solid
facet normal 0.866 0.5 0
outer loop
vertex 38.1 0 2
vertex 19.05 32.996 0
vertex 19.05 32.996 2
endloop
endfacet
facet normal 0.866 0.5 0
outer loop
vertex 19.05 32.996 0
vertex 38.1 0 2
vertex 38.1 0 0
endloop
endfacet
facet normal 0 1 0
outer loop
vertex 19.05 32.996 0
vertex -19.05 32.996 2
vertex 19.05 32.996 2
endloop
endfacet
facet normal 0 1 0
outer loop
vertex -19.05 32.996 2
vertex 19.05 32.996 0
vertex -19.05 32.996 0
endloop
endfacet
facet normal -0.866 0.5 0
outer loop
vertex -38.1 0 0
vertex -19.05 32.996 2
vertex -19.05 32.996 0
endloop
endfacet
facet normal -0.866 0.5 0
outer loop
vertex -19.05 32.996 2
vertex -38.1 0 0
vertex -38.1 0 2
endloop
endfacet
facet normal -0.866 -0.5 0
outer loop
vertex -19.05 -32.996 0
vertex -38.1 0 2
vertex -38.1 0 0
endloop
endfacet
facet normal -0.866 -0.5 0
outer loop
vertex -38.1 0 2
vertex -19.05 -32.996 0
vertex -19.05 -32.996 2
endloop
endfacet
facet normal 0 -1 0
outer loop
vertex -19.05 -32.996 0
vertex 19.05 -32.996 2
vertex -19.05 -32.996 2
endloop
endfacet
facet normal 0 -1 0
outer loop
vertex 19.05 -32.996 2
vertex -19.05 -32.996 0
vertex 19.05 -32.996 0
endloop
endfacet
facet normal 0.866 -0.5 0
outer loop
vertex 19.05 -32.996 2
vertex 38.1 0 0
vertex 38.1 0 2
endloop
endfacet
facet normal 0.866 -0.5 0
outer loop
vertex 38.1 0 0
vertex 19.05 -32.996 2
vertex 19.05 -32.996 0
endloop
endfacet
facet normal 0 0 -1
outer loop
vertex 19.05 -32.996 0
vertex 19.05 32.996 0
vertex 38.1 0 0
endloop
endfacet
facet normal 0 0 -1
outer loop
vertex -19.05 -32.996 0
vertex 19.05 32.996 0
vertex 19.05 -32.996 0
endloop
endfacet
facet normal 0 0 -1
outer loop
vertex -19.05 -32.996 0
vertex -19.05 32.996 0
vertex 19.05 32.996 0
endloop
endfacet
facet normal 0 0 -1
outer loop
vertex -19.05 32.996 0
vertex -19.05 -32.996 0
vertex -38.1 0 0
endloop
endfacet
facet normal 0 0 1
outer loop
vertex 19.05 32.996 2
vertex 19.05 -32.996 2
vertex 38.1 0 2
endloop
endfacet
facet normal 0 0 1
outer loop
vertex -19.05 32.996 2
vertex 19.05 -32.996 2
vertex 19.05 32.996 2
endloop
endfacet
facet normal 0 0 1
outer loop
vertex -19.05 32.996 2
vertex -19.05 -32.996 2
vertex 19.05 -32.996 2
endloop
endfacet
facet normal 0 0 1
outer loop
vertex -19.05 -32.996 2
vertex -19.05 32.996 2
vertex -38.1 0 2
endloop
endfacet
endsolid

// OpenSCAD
inch = 25.4;
hex_h = 2;
hex_r = 1.5 * inch;

cylinder(h = hex_h, r = hex_r, $fn = 6);
